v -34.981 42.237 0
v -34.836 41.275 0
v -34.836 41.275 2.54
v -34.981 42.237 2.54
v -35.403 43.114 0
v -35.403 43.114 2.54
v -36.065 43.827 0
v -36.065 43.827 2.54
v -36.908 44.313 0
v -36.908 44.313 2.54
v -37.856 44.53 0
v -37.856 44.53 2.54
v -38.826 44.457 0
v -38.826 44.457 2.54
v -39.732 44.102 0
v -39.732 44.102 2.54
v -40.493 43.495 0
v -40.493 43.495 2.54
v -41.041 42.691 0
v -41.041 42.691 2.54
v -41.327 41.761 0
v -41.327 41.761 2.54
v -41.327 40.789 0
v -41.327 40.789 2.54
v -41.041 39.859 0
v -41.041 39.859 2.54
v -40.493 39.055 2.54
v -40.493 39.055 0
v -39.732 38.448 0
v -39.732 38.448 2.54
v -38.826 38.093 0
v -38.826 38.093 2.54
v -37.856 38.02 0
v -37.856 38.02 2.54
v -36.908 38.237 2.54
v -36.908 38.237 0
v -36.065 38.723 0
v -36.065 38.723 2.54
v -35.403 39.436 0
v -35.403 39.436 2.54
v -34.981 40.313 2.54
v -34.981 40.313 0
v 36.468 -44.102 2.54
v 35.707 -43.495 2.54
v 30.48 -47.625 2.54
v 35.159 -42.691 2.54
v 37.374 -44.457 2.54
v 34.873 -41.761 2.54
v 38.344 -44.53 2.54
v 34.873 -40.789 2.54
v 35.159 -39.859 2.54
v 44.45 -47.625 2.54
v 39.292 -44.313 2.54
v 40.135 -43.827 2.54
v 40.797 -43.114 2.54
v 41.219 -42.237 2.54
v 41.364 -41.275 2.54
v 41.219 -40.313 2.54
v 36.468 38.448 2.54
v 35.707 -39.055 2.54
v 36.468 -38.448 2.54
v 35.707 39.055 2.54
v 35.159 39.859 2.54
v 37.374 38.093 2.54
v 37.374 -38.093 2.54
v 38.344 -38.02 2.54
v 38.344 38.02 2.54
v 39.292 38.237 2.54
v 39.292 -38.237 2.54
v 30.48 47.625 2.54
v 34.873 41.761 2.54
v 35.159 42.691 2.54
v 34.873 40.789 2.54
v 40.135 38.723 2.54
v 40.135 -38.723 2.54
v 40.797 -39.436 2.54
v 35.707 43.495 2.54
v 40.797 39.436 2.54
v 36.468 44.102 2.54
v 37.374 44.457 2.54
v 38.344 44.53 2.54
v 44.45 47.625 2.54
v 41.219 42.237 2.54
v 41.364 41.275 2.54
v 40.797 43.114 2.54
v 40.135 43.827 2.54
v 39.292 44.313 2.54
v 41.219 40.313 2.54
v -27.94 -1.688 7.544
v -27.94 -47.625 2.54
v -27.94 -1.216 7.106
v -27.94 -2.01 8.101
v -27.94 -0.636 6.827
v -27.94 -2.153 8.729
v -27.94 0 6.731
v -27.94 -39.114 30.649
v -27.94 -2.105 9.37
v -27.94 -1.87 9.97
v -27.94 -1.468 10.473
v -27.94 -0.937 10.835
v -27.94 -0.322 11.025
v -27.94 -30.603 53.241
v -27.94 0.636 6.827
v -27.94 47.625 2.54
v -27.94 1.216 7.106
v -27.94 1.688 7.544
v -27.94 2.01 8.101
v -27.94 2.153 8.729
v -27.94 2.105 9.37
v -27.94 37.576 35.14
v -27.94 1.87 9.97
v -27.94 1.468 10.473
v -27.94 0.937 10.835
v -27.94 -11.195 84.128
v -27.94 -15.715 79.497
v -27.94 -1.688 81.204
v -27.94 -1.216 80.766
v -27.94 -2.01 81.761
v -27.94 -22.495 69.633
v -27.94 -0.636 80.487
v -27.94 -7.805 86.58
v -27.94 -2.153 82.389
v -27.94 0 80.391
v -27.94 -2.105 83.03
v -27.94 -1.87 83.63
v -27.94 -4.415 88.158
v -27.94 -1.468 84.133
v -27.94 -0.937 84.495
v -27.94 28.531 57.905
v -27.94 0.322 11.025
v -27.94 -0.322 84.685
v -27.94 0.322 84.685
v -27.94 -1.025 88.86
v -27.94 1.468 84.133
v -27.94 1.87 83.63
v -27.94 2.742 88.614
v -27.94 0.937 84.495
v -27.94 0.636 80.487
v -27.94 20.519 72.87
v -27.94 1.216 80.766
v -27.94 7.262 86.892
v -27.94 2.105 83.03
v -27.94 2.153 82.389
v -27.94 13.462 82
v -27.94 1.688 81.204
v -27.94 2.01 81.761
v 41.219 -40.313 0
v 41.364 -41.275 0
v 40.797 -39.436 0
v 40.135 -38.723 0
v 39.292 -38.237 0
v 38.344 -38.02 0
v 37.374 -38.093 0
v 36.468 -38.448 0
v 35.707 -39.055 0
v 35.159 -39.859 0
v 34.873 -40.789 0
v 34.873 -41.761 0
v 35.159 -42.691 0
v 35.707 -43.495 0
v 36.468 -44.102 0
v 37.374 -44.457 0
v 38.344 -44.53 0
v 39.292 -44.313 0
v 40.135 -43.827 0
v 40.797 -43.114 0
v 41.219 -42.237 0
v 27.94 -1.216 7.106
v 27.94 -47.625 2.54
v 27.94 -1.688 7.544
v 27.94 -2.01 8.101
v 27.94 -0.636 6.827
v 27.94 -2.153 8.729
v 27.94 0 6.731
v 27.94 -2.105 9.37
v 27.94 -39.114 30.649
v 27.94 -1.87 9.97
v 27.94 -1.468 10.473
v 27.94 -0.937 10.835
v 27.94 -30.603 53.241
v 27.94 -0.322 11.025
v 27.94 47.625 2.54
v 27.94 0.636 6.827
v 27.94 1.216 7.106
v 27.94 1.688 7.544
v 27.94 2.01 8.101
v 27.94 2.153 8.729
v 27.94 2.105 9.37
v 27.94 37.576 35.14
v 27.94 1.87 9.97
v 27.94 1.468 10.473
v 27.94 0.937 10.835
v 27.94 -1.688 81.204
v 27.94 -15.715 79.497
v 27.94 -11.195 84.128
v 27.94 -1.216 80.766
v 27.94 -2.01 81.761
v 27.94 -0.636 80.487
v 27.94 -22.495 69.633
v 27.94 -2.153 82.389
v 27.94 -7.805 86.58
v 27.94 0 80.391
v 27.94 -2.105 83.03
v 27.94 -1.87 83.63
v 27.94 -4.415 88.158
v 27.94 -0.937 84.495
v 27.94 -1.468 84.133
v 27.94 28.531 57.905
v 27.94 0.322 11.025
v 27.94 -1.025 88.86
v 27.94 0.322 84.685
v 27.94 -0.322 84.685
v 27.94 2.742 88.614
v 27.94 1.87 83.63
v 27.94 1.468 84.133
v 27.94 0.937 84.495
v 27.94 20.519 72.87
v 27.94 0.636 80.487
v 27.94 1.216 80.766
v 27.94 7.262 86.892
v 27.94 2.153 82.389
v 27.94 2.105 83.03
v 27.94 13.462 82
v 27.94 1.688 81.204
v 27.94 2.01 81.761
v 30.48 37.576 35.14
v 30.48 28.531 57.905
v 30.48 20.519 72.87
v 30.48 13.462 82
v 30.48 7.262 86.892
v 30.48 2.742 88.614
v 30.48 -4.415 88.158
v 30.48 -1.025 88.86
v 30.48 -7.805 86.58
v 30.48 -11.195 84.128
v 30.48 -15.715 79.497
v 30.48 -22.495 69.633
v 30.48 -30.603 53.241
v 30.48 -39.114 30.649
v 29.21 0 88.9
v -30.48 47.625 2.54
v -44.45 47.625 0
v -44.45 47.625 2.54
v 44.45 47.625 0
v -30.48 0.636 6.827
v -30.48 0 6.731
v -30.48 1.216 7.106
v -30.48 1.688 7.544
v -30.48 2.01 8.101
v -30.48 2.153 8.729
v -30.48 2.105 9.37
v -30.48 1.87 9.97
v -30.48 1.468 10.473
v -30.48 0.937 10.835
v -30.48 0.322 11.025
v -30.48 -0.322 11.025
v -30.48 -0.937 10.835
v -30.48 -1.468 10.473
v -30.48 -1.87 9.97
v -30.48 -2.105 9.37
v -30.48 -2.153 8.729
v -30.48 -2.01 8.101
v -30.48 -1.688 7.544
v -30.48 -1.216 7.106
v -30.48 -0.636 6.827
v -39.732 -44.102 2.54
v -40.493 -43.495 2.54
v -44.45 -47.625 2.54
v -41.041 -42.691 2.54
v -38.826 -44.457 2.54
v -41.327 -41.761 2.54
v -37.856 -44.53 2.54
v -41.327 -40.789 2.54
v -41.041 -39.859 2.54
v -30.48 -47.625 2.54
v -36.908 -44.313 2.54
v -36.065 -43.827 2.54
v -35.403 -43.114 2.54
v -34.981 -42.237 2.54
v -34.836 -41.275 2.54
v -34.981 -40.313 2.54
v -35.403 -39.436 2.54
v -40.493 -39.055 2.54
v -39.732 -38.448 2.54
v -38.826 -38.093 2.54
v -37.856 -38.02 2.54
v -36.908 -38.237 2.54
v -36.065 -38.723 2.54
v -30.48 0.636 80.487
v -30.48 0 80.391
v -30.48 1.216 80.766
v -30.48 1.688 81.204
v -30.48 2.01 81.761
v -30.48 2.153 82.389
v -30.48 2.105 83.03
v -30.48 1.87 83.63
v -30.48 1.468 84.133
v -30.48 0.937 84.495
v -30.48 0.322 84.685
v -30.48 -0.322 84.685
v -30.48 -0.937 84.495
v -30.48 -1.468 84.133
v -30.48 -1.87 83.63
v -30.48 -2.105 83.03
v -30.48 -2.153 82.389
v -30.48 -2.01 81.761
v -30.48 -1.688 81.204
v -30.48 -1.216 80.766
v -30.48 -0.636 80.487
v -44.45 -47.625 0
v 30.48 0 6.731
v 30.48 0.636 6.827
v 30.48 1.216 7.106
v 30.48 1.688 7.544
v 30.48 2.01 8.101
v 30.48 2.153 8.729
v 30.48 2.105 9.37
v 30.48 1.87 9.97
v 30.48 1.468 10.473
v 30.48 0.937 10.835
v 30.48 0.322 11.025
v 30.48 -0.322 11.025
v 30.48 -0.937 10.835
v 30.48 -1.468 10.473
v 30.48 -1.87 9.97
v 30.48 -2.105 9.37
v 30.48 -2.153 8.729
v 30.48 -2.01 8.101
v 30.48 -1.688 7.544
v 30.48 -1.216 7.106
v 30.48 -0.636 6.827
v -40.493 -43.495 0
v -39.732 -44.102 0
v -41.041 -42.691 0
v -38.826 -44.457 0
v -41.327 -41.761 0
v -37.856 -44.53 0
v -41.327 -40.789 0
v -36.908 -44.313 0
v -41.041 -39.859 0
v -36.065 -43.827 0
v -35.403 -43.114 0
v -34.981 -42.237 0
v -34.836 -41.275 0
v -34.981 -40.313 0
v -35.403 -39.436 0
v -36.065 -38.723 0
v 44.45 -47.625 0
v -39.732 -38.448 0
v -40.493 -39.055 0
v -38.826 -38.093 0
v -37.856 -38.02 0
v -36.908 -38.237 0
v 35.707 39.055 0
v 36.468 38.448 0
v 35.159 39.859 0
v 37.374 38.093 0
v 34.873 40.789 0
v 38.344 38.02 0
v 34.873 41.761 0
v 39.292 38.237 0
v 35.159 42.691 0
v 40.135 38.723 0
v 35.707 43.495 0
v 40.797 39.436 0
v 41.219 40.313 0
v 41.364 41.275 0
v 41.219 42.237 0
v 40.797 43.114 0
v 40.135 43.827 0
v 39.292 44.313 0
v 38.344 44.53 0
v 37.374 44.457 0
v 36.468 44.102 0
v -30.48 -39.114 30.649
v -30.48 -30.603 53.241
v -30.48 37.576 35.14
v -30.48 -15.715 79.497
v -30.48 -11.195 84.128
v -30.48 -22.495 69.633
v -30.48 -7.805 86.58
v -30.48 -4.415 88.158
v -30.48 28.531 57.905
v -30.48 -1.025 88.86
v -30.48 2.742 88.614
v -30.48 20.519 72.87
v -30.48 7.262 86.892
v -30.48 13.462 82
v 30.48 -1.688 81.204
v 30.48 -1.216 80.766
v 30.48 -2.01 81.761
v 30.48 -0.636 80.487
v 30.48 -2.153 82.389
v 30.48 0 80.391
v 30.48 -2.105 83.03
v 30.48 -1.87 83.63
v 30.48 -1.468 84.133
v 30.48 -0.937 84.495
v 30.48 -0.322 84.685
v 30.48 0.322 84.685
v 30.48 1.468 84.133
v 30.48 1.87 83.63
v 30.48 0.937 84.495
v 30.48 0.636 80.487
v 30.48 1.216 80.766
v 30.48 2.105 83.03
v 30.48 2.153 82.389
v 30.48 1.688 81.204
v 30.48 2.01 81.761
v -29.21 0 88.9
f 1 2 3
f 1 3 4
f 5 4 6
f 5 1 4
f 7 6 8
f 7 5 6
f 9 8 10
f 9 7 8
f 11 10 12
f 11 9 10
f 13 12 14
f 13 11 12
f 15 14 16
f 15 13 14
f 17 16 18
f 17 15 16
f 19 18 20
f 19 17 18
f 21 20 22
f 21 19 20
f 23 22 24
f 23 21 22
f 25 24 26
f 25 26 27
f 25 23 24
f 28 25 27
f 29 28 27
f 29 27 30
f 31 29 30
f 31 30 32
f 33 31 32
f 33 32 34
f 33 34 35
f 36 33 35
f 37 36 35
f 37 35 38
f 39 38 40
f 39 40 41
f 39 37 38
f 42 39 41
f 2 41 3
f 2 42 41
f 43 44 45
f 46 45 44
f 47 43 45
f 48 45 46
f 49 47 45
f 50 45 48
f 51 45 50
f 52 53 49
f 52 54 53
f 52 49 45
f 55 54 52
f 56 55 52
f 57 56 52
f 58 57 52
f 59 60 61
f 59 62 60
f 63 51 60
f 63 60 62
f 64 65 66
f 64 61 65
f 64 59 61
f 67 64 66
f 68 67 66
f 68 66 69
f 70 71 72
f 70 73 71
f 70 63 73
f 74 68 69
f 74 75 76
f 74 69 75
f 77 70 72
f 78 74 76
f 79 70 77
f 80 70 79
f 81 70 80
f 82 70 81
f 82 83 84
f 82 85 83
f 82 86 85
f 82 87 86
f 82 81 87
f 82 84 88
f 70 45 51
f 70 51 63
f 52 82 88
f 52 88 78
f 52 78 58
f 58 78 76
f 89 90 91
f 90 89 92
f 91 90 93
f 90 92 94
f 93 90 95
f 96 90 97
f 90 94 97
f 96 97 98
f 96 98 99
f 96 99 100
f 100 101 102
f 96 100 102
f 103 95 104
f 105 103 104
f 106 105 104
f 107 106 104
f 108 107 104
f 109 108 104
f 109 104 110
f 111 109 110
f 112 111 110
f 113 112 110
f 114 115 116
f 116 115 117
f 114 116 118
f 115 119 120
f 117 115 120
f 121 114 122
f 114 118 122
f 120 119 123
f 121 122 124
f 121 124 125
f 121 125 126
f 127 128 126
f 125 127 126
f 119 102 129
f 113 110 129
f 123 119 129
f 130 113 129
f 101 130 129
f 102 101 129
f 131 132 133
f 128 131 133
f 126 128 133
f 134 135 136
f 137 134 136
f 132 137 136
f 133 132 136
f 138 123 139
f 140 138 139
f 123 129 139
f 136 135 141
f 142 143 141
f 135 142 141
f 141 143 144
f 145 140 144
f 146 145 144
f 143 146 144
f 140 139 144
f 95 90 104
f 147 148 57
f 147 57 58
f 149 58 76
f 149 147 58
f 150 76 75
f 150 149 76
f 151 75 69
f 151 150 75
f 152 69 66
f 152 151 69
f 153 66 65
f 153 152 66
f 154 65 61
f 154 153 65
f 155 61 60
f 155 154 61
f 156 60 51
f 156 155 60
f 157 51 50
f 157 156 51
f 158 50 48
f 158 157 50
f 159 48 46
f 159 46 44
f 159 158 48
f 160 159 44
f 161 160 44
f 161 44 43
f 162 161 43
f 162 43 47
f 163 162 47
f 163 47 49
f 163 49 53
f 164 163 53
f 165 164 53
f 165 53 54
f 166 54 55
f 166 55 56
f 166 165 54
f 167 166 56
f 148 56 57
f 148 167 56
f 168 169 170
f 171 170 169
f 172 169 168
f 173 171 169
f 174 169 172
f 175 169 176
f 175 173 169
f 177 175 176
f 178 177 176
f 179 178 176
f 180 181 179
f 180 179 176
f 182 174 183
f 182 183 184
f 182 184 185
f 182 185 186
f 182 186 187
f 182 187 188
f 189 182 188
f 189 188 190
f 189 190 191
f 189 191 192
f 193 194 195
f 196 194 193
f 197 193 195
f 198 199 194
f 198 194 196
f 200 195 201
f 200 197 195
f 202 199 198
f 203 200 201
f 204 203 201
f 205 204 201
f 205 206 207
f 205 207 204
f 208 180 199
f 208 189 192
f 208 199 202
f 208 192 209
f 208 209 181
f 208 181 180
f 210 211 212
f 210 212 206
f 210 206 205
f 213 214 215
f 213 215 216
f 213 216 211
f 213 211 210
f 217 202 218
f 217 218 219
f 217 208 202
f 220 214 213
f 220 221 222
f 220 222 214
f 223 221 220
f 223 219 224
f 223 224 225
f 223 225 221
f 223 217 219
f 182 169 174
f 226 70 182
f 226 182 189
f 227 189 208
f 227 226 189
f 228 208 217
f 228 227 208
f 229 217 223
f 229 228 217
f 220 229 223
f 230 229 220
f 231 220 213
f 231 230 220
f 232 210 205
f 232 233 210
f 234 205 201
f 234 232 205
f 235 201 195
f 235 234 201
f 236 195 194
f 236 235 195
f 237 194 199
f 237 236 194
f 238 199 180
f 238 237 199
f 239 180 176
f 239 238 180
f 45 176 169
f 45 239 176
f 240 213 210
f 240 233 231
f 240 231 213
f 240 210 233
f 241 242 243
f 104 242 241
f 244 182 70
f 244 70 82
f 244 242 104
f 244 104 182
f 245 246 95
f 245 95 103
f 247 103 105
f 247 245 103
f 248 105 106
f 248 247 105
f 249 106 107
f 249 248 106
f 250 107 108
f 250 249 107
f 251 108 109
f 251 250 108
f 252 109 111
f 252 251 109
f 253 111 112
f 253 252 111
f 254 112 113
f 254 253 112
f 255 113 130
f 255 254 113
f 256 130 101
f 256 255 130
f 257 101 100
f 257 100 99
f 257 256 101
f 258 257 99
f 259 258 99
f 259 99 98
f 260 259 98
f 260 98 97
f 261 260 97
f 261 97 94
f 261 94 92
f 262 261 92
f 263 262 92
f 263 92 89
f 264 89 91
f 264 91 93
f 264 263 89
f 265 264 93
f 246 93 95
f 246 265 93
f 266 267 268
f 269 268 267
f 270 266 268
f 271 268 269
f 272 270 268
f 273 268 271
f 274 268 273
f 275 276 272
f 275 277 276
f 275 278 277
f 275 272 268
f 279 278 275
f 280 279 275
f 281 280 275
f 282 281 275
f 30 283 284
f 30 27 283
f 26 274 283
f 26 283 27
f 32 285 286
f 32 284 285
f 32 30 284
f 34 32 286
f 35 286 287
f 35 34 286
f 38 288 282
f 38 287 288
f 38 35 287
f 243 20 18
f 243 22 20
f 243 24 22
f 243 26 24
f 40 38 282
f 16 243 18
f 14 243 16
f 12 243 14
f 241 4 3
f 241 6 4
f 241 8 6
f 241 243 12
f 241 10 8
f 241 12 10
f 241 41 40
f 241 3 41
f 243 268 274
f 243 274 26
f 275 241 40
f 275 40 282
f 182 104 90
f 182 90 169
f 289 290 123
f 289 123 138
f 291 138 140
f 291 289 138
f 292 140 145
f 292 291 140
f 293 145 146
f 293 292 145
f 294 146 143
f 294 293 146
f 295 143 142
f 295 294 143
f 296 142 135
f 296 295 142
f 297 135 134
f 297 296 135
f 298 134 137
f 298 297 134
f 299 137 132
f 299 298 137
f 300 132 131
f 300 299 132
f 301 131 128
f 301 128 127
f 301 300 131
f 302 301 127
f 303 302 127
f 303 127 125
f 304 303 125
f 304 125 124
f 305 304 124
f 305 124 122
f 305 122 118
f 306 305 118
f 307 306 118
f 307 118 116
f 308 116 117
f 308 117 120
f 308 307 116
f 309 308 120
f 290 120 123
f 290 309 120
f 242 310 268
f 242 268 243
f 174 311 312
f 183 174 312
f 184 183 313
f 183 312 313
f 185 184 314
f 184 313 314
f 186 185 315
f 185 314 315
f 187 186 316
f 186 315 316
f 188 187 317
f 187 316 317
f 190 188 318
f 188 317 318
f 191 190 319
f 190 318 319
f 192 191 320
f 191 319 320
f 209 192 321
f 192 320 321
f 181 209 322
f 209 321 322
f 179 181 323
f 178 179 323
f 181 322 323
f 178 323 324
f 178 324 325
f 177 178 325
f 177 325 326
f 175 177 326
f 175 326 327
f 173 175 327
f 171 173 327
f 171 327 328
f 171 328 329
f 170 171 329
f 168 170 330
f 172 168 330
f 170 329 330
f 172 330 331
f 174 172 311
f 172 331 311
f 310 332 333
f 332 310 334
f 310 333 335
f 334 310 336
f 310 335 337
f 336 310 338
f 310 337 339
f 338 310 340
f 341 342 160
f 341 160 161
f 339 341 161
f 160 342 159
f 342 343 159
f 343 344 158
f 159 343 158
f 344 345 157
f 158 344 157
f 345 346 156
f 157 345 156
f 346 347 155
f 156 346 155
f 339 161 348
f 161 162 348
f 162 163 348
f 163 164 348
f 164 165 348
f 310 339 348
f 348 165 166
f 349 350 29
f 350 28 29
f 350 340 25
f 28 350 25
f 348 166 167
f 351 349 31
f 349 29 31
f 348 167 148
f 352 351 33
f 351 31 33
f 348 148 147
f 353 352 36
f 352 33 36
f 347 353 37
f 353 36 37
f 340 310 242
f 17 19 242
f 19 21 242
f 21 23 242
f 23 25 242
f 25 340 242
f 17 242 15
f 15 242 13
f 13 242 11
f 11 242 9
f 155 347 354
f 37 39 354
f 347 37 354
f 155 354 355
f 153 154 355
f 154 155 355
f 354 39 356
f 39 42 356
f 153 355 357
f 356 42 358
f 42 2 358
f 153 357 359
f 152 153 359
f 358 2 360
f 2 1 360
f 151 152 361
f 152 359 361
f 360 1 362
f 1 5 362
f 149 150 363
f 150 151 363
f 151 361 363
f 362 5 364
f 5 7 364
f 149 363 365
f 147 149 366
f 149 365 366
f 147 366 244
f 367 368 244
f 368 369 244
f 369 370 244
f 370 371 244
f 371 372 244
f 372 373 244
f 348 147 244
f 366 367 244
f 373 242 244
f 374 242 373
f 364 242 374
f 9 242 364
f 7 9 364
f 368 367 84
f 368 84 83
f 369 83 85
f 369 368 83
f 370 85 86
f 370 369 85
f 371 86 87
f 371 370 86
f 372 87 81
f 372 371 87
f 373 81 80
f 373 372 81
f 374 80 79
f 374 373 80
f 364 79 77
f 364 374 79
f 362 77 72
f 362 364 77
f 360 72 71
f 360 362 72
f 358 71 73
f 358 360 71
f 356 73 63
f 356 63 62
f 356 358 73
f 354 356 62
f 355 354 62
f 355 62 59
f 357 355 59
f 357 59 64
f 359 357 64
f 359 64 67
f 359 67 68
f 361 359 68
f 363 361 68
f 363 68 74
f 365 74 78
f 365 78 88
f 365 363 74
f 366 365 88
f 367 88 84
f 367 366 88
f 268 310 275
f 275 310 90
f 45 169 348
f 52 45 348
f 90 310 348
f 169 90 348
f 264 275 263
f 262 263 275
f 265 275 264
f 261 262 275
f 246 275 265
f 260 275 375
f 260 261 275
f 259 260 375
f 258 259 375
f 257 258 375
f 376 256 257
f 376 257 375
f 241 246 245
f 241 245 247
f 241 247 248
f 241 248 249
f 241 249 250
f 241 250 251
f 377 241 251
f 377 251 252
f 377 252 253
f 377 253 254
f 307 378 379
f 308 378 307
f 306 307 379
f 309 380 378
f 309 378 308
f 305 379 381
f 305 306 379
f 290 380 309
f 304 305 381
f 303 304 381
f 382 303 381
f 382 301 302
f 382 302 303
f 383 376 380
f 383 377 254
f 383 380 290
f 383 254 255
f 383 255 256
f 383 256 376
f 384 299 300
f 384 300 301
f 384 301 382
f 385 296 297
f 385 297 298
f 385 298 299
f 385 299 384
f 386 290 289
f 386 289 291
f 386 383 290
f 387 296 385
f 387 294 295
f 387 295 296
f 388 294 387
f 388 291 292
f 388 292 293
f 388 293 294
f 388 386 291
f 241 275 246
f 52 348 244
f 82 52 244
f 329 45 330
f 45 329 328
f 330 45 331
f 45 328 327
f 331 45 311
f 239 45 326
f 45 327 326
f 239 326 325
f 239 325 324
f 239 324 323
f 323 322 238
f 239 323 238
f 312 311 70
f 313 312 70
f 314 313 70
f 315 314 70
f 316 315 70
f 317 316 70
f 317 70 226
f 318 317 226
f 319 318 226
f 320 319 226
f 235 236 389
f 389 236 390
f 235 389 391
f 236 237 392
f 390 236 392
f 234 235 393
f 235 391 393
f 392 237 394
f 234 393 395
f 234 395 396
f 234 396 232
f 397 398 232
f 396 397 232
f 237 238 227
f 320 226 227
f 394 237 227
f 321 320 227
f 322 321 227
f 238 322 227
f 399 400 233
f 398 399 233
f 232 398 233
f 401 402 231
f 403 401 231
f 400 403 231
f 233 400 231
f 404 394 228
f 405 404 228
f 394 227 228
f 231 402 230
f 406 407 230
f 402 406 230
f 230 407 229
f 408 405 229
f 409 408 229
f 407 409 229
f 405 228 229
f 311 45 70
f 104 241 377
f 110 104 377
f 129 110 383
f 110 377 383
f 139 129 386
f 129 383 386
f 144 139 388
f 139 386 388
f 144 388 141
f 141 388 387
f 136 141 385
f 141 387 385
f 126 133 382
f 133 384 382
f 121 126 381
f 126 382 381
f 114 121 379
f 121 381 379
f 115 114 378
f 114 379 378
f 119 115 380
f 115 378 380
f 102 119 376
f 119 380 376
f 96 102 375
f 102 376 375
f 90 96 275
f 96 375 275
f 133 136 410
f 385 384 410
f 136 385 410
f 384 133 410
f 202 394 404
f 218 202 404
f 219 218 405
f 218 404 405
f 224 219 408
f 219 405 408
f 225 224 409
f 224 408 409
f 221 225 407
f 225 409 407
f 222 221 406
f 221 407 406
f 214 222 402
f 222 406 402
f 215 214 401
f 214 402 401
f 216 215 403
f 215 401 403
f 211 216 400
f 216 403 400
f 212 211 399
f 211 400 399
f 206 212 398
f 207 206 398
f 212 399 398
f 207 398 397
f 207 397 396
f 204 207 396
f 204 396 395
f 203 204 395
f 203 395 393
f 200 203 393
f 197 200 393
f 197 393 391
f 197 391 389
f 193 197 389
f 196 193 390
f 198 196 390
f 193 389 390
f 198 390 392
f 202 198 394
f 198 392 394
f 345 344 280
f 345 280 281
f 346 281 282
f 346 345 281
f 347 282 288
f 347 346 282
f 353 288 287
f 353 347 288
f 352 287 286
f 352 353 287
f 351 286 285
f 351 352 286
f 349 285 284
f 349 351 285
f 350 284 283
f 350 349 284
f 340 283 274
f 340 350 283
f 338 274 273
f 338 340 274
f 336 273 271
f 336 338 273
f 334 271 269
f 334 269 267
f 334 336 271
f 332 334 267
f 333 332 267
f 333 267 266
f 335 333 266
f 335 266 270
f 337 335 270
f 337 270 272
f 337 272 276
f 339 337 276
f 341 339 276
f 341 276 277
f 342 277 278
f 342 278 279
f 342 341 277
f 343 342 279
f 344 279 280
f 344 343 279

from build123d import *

# Parameters (mm, degrees)
SKETCH1_W           = 88.9
SKETCH1_H           = 95.25
SKETCH1_R           = 3.2639
BOSS_EXTRUDE1_DEPTH = 2.54
SKETCH4_R           = 2.159
BOSS_EXTRUDE2_DEPTH = 2.54


with BuildPart() as part:
    # Sketch1 → Boss-Extrude1 (new body)
    with BuildSketch(Plane.XY):
        Rectangle(SKETCH1_W, SKETCH1_H)
        with Locations((-38.1, -41.275)):
            Circle(SKETCH1_R, mode=Mode.SUBTRACT)
        with Locations((38.1, -41.275)):
            Circle(SKETCH1_R, mode=Mode.SUBTRACT)
        with Locations((38.1, 41.275)):
            Circle(SKETCH1_R, mode=Mode.SUBTRACT)
        with Locations((-38.1, 41.275)):
            Circle(SKETCH1_R, mode=Mode.SUBTRACT)
    extrude(amount=BOSS_EXTRUDE1_DEPTH)

    # Sketch4 → Boss-Extrude2 (add)
    with BuildSketch(Plane(origin=(30.48, 0, 0), x_dir=(0, 0, -1), z_dir=(1, 0, 0))):
        with BuildLine():
            Line((-2.54, 47.625), (-2.54, -47.625))
            add(Edge.make_bspline(
                [(-2.54, 47.625), (-175.26, 0), (-2.54, -47.625)],
                knots=[0, 0, 0, 1, 1, 1], degree=2))
        make_face()
        with Locations((-82.55, 0)):
            Circle(SKETCH4_R, mode=Mode.SUBTRACT)
        with Locations((-8.89, 0)):
            Circle(SKETCH4_R, mode=Mode.SUBTRACT)
    boss_extrude2 = extrude(amount=-BOSS_EXTRUDE2_DEPTH)

    # Mirror1: Boss-Extrude2 across plane
    add(boss_extrude2.mirror(Plane(origin=(0, 0, 0), x_dir=(0, 0, 1), z_dir=(1, 0, 0))))


solid = part.part
